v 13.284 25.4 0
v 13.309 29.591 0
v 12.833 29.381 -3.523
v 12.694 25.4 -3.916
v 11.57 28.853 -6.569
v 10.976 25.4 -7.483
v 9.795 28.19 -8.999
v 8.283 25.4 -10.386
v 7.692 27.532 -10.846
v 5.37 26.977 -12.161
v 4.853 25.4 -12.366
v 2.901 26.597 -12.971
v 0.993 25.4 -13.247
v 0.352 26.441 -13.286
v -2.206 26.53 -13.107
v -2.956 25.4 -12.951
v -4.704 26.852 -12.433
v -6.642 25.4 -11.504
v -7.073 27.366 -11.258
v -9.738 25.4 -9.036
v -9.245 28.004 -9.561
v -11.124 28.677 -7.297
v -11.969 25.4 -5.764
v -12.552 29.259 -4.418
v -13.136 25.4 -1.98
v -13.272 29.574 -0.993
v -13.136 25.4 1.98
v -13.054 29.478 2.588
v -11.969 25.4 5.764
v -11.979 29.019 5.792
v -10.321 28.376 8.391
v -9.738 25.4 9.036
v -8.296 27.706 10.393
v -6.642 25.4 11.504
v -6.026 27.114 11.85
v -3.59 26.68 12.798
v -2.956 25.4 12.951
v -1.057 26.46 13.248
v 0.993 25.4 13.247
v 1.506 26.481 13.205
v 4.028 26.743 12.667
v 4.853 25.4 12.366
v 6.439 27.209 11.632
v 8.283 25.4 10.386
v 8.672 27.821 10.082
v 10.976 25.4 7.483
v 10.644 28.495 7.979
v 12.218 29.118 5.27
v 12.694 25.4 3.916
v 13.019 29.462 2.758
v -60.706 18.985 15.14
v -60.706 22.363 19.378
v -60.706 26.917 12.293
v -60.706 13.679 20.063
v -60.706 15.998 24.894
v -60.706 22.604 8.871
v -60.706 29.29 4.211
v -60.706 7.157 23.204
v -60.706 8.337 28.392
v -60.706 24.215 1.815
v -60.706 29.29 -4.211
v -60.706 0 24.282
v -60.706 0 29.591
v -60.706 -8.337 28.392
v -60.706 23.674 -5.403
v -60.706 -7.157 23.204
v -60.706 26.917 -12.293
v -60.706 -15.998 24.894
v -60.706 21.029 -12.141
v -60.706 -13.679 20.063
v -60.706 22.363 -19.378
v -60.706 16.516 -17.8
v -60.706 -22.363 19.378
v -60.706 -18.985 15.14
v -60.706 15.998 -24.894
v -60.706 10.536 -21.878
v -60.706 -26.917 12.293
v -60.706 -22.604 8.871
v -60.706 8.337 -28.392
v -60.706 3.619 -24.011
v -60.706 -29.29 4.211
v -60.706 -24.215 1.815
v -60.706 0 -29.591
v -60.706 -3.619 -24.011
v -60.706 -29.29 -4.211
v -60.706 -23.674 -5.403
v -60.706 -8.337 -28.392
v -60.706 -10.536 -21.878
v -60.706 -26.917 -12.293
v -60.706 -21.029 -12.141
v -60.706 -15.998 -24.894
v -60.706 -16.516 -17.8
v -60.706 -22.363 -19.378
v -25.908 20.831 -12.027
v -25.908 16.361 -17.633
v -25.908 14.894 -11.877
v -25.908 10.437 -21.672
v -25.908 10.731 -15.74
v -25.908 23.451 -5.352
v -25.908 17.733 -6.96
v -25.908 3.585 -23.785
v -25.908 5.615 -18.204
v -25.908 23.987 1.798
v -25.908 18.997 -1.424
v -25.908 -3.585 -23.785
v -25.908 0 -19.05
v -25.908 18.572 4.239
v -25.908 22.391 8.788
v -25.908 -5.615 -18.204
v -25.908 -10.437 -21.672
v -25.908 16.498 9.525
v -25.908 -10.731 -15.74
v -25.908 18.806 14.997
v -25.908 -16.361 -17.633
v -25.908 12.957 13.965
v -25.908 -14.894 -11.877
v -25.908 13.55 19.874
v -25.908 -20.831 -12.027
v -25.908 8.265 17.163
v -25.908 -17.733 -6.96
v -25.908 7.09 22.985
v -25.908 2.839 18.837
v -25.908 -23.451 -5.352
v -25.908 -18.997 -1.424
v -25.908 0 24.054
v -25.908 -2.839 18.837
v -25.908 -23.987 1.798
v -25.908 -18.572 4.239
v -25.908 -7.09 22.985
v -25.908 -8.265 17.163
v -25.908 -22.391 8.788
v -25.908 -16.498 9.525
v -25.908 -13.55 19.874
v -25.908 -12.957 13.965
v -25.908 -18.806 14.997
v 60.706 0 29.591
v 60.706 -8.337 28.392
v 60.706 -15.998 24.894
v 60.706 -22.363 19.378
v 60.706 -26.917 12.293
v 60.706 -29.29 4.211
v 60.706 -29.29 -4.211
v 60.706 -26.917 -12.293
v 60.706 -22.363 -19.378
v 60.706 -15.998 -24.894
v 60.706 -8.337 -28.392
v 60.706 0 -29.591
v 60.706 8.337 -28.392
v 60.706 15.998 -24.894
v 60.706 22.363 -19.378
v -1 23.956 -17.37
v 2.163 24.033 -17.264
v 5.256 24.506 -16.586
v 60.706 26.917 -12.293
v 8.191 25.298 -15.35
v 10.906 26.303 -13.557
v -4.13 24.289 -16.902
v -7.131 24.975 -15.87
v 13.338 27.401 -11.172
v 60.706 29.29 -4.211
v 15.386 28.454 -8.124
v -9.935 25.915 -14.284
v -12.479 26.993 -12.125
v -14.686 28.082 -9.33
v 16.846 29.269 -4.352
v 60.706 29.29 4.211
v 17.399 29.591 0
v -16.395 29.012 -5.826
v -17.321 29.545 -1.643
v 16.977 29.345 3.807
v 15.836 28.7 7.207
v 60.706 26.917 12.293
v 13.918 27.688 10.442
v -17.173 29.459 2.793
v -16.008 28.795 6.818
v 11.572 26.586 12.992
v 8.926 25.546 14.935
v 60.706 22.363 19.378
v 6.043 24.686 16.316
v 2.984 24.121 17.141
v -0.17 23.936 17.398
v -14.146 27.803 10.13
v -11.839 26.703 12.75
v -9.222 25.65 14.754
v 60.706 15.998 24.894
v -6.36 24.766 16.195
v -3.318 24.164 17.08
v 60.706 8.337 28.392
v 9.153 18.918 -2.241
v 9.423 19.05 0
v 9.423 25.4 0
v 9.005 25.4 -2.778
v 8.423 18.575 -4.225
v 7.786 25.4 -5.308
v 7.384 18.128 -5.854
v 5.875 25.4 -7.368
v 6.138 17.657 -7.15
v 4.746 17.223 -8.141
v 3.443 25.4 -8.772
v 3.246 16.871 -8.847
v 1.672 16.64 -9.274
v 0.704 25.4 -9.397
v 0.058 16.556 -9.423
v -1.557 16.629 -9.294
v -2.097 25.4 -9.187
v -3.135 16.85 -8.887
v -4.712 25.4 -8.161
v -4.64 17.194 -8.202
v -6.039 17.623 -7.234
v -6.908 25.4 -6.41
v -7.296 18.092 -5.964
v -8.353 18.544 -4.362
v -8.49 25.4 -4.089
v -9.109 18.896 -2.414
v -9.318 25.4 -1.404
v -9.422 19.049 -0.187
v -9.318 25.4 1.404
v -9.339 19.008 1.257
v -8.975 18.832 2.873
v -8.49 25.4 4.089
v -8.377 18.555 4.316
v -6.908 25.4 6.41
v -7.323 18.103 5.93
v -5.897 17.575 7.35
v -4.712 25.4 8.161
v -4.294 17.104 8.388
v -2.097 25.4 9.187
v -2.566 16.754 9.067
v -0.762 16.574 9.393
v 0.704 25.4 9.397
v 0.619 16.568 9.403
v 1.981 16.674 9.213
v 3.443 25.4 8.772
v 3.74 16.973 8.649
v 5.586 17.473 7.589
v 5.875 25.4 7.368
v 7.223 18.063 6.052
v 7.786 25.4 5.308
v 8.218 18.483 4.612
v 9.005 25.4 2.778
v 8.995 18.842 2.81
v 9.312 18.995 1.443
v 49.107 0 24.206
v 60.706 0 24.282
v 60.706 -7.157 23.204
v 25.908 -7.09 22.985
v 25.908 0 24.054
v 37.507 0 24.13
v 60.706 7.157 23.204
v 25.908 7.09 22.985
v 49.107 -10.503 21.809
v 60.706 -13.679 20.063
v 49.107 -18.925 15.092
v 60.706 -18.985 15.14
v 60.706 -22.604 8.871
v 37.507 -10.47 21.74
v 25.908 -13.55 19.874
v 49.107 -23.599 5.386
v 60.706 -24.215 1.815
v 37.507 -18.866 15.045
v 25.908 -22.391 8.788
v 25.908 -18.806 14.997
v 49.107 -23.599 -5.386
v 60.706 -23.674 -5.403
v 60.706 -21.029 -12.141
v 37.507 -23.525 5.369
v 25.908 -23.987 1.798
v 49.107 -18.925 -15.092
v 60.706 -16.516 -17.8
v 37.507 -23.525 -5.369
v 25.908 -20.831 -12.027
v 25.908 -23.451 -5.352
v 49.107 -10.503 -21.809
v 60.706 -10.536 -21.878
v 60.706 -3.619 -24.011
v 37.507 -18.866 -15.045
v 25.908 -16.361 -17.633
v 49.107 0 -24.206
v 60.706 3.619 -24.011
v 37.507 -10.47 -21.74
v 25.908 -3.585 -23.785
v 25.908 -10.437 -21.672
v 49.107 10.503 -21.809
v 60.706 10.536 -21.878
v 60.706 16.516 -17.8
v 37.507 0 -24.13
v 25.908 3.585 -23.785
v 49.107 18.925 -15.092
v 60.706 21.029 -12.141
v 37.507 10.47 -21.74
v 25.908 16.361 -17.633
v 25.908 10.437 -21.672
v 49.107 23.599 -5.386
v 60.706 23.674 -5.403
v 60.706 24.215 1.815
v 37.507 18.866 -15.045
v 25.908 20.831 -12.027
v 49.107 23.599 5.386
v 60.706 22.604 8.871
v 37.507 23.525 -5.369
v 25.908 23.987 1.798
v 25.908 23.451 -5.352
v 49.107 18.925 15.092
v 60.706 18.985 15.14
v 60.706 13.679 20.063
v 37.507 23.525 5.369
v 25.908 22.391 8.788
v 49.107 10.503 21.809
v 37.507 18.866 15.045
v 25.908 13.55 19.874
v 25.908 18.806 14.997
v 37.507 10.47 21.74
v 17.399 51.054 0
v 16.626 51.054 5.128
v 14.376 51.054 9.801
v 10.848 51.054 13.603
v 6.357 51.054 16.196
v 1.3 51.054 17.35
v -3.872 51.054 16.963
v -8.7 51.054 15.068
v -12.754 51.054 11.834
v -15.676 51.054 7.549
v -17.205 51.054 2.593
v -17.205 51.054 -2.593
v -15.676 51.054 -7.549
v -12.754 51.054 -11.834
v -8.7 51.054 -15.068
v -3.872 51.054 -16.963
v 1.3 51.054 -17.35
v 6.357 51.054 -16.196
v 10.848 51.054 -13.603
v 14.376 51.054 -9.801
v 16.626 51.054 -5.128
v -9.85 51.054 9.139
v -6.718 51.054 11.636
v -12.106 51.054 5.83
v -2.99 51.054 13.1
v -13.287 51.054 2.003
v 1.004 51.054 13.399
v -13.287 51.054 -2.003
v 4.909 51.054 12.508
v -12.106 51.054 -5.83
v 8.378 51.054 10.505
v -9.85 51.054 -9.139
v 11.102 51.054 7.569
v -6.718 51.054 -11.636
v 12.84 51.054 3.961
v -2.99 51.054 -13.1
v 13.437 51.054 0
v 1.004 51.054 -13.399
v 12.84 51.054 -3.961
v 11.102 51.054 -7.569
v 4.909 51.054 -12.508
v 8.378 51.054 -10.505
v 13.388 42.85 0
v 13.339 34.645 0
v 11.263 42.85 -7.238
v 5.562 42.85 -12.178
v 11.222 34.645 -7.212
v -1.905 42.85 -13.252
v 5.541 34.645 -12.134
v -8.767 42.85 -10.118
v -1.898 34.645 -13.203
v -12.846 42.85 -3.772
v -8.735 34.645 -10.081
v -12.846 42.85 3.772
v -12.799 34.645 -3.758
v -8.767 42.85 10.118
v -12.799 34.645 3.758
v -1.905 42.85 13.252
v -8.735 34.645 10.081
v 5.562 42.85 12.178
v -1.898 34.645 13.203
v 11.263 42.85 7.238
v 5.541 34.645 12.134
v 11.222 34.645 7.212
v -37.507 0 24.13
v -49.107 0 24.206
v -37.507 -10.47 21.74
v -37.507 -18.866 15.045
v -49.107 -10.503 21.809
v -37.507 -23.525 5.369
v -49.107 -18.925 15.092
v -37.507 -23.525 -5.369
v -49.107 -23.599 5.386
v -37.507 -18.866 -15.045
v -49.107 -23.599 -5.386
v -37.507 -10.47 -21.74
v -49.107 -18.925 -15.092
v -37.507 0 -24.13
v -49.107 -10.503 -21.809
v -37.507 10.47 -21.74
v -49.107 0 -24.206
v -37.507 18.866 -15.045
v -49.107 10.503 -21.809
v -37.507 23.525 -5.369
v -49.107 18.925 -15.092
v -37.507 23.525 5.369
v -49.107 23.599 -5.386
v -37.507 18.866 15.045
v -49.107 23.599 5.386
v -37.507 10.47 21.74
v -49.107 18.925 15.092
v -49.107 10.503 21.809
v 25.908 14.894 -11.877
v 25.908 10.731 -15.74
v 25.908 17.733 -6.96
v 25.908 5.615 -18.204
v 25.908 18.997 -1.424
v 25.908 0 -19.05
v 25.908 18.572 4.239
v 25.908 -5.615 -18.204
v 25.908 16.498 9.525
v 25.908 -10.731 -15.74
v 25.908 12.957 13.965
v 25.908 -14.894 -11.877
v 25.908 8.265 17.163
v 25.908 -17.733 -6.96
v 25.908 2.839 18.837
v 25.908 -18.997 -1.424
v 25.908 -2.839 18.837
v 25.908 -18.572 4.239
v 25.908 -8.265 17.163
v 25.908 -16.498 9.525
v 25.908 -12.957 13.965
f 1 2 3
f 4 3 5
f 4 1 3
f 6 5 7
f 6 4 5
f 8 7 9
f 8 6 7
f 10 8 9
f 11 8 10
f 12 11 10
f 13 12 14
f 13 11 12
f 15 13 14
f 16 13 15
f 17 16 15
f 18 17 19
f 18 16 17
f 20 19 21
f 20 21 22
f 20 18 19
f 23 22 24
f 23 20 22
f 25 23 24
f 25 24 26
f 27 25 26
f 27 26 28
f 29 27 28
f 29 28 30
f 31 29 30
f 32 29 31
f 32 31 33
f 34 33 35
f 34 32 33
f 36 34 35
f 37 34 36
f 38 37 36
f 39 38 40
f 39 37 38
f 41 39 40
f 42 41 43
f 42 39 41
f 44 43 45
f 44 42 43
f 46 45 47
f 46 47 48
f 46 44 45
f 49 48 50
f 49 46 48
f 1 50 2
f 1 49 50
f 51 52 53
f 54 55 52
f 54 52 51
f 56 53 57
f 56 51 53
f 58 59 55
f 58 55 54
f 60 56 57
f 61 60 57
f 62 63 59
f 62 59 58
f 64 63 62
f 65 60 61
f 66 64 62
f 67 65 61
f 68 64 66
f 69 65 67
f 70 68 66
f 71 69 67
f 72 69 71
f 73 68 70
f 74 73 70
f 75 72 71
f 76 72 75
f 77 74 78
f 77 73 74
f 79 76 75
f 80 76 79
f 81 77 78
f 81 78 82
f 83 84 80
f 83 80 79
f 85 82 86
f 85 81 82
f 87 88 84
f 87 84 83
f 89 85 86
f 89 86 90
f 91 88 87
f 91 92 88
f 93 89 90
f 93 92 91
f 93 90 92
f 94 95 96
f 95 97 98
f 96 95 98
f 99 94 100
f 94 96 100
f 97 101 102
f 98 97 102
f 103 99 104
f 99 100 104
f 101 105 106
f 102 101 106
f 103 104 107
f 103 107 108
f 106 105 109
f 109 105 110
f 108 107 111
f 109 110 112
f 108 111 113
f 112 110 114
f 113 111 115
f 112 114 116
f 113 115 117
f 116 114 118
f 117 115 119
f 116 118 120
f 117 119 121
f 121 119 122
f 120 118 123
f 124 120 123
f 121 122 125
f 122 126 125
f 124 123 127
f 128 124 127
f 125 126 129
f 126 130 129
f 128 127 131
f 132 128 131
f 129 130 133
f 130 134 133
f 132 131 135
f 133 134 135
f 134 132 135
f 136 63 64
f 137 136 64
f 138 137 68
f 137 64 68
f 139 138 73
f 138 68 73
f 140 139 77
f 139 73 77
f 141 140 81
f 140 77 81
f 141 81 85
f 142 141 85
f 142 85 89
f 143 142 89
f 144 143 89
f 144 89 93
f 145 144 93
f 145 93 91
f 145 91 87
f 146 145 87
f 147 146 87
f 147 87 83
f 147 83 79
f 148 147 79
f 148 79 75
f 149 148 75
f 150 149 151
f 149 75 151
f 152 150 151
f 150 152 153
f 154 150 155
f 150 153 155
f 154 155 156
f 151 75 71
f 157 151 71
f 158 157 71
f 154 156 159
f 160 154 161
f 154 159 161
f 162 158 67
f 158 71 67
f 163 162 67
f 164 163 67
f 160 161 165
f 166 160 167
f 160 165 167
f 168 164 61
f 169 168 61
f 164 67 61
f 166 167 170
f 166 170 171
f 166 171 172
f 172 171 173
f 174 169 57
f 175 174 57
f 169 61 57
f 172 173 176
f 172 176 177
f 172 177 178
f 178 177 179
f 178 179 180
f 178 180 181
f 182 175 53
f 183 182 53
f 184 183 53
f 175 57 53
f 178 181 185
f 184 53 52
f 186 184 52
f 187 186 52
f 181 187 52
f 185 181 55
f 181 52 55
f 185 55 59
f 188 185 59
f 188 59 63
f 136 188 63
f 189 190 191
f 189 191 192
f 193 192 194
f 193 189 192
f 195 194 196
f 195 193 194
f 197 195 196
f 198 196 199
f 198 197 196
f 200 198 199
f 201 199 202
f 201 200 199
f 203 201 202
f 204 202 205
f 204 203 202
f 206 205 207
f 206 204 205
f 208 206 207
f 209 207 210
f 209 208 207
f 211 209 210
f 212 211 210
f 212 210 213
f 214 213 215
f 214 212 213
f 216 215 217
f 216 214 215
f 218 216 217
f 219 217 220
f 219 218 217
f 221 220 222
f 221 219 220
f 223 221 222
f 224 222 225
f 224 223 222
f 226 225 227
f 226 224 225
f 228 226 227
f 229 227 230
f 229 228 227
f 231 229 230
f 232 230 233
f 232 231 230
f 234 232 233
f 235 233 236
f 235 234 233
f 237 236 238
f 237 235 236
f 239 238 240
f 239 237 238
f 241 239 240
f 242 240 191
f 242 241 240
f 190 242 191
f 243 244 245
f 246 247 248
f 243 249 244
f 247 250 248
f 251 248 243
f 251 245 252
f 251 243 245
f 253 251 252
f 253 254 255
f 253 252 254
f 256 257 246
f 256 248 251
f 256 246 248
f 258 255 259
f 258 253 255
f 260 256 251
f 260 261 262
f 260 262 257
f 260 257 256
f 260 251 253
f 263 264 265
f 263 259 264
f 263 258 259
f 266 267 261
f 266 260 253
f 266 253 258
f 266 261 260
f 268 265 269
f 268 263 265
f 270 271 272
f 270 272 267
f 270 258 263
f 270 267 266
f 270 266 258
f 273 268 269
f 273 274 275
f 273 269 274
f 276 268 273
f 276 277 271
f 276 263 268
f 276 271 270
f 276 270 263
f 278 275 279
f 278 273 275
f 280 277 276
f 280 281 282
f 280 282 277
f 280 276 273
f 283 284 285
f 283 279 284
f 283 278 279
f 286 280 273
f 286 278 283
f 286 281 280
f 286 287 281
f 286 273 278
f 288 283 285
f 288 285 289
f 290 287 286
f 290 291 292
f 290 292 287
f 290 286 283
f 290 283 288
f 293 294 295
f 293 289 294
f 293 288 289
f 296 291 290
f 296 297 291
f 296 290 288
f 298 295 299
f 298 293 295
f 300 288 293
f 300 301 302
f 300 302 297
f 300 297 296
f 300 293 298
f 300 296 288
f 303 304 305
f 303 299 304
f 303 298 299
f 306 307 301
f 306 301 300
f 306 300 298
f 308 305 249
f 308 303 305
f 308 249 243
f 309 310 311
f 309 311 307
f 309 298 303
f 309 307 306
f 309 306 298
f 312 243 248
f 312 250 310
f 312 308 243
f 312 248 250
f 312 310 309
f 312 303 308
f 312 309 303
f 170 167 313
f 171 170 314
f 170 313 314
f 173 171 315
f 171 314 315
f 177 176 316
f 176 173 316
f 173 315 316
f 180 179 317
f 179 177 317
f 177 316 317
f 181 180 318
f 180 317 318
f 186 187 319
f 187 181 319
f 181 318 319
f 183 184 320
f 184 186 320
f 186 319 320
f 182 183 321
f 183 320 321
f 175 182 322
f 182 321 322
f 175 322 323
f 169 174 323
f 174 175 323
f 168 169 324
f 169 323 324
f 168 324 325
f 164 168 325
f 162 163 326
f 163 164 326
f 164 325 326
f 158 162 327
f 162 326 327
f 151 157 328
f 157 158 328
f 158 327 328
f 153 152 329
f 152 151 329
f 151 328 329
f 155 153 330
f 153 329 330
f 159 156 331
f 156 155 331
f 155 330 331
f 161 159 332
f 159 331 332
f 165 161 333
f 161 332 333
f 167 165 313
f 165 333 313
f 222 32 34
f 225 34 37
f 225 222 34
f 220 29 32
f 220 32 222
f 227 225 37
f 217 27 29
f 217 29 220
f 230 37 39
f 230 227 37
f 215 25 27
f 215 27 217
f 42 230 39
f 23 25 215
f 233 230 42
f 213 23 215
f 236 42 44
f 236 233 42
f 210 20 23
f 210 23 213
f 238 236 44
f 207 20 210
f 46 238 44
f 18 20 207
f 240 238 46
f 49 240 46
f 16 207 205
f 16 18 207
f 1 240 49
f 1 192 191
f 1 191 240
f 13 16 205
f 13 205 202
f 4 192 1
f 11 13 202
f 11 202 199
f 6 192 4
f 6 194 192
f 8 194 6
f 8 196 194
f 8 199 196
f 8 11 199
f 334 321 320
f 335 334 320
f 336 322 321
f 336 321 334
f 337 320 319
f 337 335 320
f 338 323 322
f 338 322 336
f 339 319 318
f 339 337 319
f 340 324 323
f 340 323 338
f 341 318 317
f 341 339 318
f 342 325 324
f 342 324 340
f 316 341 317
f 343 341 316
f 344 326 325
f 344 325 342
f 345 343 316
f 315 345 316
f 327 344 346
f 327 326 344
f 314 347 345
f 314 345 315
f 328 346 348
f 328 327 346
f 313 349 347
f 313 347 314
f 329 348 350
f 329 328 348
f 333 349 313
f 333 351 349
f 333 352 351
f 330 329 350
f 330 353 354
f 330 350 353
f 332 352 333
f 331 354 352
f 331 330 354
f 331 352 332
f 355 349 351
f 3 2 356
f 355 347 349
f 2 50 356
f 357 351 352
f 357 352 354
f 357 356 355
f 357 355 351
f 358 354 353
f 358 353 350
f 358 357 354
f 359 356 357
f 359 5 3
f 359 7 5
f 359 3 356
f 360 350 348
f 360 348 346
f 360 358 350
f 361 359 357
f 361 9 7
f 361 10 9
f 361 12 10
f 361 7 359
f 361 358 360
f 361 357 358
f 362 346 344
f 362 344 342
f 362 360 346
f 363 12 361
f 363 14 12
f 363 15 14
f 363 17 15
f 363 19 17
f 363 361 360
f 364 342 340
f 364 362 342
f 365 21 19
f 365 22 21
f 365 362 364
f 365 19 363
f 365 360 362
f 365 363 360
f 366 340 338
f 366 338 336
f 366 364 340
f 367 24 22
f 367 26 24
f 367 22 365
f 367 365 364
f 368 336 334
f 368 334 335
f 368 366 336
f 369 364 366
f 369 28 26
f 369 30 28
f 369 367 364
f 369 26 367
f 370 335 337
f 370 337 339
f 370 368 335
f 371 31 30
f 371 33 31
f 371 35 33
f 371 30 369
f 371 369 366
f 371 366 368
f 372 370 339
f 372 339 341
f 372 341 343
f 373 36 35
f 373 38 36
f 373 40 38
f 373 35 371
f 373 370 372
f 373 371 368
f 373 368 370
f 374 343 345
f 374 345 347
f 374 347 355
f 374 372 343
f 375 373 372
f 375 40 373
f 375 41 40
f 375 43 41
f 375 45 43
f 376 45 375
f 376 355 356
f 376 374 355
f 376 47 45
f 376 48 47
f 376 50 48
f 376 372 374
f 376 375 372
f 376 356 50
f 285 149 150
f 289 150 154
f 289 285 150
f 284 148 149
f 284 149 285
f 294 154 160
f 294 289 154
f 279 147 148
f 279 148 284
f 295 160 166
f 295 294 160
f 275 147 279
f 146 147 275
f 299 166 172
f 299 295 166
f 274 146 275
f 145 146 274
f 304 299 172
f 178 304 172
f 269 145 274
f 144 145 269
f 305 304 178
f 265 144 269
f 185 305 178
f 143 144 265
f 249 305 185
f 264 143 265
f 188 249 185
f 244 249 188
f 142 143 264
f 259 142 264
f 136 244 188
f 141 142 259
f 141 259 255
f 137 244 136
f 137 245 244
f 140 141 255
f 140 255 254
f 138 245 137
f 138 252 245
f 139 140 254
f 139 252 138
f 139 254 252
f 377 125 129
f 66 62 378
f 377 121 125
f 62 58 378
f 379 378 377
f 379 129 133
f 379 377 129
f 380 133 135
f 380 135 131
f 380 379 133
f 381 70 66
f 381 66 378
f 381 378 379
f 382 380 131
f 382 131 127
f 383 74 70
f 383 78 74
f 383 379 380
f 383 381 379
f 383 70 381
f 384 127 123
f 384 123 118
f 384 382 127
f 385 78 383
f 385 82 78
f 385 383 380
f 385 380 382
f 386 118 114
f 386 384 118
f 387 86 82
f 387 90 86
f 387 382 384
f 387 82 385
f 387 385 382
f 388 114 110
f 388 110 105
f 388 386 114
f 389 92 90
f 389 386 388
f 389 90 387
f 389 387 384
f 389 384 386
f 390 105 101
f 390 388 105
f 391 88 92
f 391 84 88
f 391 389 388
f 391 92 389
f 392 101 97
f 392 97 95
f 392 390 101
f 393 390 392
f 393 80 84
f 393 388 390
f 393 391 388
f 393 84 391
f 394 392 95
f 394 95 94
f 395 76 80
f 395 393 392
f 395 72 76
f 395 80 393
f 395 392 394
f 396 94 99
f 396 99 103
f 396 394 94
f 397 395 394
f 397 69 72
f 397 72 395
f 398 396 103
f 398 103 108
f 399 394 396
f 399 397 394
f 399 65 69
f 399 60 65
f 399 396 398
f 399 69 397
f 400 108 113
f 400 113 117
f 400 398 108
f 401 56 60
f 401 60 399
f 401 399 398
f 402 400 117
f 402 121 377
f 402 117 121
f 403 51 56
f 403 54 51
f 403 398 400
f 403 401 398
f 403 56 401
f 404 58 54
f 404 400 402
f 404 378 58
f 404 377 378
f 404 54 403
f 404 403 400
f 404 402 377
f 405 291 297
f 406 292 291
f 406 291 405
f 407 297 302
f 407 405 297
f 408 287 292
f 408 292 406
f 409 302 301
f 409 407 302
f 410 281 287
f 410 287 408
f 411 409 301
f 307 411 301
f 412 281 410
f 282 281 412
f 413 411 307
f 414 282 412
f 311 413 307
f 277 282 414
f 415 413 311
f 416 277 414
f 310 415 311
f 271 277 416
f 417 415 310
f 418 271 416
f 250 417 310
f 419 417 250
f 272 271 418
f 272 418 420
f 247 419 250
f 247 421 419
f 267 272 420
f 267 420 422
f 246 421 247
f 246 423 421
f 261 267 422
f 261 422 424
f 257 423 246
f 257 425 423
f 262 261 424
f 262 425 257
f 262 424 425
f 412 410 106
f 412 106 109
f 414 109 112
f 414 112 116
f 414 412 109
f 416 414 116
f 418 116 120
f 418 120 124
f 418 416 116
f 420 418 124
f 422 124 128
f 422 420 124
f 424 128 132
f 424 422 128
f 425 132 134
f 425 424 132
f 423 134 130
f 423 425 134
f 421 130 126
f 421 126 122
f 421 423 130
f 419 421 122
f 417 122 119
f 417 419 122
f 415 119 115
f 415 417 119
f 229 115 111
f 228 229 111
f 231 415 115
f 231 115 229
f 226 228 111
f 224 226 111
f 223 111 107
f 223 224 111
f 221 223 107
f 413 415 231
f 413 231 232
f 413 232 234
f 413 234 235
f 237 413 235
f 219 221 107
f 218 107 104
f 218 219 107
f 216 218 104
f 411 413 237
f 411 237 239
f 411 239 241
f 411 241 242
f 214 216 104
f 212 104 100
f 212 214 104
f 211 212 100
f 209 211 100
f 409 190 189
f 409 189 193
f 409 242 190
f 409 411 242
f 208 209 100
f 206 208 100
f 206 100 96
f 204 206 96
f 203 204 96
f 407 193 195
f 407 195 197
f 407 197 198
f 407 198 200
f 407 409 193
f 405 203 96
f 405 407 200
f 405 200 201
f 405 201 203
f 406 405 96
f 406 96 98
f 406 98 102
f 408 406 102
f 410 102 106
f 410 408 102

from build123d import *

# Parameters (mm, degrees)
SKETCH4_R           = 29.591
BOSS_EXTRUDE1_DEPTH = 51.816
SKETCH5_R           = 17.399
BOSS_EXTRUDE2_DEPTH = 25.4


with BuildPart() as part:
    # Sketch1 → Revolve1 (revolve)
    with BuildSketch(Plane.XY, mode=Mode.PRIVATE) as revolve1_sk:
        Polygon((-60.706, -29.591), (-25.908, -29.591), (-25.908, -24.0538), (-60.706, -24.2824), align=None)
        Polygon((60.706, -24.2824), (25.908, -24.0538), (25.908, -29.591), (60.706, -29.591), align=None)
    revolve(revolve1_sk.sketch.rotate(Axis((-60.706, 0, 0), (1, 0, 0)), 270), axis=Axis((-60.706, 0, 0), (1, 0, 0)))



with BuildPart() as body_2:
    # Sketch2 → Revolve2 (revolve)
    with BuildSketch(Plane.XY):
        Polygon((13.4366, 51.054), (13.2842, 25.4), (17.399, 25.4), (17.399, 51.054), align=None)
    revolve(axis=Axis((0, 0, 0), (0, 1, 0)))


with BuildPart() as part_1:
    add(part.part)

    add(body_2.part)  # Boss-Extrude1 merges body 2
    # Sketch4 → Boss-Extrude1 (add)
    with BuildSketch(Plane(origin=(-25.908, 0, 0), x_dir=(0, 0, -1), z_dir=(1, 0, 0))):
        with Locations(Location((0, 0, 0), (0, 0, 180))):
            Circle(SKETCH4_R)
    extrude(amount=BOSS_EXTRUDE1_DEPTH)

    # Sketch5 → Boss-Extrude2 (add)
    with BuildSketch(Plane.XZ.offset(-25.4)):
        Circle(SKETCH5_R)
    extrude(amount=BOSS_EXTRUDE2_DEPTH)

    # Sketch6 → Cut-Revolve1 (revolve, cut)
    with BuildSketch(Plane.XY, mode=Mode.PRIVATE) as cut_revolve1_sk:
        Polygon((-60.706, -24.2824), (-25.908, -24.0538), (-25.908, -19.05), (25.908, -19.05), (25.908, -24.0538), (60.706, -24.2824), (60.706, 0), (-60.706, 0), align=None)
    revolve(cut_revolve1_sk.sketch.rotate(Axis((60.706, 0, 0), (-1, 0, 0)), 270), axis=Axis((60.706, 0, 0), (-1, 0, 0)), mode=Mode.SUBTRACT)

    # Sketch7 → Cut-Revolve2 (revolve, cut)
    with BuildSketch(Plane.XY):
        Polygon((13.4366, 51.054), (13.2842, 25.4), (9.4234, 25.4), (9.4234, 0), (0, 0), (0, 51.054), align=None)
    revolve(axis=Axis((0, 0, 0), (0, 1, 0)), mode=Mode.SUBTRACT)


solid = part_1.part
